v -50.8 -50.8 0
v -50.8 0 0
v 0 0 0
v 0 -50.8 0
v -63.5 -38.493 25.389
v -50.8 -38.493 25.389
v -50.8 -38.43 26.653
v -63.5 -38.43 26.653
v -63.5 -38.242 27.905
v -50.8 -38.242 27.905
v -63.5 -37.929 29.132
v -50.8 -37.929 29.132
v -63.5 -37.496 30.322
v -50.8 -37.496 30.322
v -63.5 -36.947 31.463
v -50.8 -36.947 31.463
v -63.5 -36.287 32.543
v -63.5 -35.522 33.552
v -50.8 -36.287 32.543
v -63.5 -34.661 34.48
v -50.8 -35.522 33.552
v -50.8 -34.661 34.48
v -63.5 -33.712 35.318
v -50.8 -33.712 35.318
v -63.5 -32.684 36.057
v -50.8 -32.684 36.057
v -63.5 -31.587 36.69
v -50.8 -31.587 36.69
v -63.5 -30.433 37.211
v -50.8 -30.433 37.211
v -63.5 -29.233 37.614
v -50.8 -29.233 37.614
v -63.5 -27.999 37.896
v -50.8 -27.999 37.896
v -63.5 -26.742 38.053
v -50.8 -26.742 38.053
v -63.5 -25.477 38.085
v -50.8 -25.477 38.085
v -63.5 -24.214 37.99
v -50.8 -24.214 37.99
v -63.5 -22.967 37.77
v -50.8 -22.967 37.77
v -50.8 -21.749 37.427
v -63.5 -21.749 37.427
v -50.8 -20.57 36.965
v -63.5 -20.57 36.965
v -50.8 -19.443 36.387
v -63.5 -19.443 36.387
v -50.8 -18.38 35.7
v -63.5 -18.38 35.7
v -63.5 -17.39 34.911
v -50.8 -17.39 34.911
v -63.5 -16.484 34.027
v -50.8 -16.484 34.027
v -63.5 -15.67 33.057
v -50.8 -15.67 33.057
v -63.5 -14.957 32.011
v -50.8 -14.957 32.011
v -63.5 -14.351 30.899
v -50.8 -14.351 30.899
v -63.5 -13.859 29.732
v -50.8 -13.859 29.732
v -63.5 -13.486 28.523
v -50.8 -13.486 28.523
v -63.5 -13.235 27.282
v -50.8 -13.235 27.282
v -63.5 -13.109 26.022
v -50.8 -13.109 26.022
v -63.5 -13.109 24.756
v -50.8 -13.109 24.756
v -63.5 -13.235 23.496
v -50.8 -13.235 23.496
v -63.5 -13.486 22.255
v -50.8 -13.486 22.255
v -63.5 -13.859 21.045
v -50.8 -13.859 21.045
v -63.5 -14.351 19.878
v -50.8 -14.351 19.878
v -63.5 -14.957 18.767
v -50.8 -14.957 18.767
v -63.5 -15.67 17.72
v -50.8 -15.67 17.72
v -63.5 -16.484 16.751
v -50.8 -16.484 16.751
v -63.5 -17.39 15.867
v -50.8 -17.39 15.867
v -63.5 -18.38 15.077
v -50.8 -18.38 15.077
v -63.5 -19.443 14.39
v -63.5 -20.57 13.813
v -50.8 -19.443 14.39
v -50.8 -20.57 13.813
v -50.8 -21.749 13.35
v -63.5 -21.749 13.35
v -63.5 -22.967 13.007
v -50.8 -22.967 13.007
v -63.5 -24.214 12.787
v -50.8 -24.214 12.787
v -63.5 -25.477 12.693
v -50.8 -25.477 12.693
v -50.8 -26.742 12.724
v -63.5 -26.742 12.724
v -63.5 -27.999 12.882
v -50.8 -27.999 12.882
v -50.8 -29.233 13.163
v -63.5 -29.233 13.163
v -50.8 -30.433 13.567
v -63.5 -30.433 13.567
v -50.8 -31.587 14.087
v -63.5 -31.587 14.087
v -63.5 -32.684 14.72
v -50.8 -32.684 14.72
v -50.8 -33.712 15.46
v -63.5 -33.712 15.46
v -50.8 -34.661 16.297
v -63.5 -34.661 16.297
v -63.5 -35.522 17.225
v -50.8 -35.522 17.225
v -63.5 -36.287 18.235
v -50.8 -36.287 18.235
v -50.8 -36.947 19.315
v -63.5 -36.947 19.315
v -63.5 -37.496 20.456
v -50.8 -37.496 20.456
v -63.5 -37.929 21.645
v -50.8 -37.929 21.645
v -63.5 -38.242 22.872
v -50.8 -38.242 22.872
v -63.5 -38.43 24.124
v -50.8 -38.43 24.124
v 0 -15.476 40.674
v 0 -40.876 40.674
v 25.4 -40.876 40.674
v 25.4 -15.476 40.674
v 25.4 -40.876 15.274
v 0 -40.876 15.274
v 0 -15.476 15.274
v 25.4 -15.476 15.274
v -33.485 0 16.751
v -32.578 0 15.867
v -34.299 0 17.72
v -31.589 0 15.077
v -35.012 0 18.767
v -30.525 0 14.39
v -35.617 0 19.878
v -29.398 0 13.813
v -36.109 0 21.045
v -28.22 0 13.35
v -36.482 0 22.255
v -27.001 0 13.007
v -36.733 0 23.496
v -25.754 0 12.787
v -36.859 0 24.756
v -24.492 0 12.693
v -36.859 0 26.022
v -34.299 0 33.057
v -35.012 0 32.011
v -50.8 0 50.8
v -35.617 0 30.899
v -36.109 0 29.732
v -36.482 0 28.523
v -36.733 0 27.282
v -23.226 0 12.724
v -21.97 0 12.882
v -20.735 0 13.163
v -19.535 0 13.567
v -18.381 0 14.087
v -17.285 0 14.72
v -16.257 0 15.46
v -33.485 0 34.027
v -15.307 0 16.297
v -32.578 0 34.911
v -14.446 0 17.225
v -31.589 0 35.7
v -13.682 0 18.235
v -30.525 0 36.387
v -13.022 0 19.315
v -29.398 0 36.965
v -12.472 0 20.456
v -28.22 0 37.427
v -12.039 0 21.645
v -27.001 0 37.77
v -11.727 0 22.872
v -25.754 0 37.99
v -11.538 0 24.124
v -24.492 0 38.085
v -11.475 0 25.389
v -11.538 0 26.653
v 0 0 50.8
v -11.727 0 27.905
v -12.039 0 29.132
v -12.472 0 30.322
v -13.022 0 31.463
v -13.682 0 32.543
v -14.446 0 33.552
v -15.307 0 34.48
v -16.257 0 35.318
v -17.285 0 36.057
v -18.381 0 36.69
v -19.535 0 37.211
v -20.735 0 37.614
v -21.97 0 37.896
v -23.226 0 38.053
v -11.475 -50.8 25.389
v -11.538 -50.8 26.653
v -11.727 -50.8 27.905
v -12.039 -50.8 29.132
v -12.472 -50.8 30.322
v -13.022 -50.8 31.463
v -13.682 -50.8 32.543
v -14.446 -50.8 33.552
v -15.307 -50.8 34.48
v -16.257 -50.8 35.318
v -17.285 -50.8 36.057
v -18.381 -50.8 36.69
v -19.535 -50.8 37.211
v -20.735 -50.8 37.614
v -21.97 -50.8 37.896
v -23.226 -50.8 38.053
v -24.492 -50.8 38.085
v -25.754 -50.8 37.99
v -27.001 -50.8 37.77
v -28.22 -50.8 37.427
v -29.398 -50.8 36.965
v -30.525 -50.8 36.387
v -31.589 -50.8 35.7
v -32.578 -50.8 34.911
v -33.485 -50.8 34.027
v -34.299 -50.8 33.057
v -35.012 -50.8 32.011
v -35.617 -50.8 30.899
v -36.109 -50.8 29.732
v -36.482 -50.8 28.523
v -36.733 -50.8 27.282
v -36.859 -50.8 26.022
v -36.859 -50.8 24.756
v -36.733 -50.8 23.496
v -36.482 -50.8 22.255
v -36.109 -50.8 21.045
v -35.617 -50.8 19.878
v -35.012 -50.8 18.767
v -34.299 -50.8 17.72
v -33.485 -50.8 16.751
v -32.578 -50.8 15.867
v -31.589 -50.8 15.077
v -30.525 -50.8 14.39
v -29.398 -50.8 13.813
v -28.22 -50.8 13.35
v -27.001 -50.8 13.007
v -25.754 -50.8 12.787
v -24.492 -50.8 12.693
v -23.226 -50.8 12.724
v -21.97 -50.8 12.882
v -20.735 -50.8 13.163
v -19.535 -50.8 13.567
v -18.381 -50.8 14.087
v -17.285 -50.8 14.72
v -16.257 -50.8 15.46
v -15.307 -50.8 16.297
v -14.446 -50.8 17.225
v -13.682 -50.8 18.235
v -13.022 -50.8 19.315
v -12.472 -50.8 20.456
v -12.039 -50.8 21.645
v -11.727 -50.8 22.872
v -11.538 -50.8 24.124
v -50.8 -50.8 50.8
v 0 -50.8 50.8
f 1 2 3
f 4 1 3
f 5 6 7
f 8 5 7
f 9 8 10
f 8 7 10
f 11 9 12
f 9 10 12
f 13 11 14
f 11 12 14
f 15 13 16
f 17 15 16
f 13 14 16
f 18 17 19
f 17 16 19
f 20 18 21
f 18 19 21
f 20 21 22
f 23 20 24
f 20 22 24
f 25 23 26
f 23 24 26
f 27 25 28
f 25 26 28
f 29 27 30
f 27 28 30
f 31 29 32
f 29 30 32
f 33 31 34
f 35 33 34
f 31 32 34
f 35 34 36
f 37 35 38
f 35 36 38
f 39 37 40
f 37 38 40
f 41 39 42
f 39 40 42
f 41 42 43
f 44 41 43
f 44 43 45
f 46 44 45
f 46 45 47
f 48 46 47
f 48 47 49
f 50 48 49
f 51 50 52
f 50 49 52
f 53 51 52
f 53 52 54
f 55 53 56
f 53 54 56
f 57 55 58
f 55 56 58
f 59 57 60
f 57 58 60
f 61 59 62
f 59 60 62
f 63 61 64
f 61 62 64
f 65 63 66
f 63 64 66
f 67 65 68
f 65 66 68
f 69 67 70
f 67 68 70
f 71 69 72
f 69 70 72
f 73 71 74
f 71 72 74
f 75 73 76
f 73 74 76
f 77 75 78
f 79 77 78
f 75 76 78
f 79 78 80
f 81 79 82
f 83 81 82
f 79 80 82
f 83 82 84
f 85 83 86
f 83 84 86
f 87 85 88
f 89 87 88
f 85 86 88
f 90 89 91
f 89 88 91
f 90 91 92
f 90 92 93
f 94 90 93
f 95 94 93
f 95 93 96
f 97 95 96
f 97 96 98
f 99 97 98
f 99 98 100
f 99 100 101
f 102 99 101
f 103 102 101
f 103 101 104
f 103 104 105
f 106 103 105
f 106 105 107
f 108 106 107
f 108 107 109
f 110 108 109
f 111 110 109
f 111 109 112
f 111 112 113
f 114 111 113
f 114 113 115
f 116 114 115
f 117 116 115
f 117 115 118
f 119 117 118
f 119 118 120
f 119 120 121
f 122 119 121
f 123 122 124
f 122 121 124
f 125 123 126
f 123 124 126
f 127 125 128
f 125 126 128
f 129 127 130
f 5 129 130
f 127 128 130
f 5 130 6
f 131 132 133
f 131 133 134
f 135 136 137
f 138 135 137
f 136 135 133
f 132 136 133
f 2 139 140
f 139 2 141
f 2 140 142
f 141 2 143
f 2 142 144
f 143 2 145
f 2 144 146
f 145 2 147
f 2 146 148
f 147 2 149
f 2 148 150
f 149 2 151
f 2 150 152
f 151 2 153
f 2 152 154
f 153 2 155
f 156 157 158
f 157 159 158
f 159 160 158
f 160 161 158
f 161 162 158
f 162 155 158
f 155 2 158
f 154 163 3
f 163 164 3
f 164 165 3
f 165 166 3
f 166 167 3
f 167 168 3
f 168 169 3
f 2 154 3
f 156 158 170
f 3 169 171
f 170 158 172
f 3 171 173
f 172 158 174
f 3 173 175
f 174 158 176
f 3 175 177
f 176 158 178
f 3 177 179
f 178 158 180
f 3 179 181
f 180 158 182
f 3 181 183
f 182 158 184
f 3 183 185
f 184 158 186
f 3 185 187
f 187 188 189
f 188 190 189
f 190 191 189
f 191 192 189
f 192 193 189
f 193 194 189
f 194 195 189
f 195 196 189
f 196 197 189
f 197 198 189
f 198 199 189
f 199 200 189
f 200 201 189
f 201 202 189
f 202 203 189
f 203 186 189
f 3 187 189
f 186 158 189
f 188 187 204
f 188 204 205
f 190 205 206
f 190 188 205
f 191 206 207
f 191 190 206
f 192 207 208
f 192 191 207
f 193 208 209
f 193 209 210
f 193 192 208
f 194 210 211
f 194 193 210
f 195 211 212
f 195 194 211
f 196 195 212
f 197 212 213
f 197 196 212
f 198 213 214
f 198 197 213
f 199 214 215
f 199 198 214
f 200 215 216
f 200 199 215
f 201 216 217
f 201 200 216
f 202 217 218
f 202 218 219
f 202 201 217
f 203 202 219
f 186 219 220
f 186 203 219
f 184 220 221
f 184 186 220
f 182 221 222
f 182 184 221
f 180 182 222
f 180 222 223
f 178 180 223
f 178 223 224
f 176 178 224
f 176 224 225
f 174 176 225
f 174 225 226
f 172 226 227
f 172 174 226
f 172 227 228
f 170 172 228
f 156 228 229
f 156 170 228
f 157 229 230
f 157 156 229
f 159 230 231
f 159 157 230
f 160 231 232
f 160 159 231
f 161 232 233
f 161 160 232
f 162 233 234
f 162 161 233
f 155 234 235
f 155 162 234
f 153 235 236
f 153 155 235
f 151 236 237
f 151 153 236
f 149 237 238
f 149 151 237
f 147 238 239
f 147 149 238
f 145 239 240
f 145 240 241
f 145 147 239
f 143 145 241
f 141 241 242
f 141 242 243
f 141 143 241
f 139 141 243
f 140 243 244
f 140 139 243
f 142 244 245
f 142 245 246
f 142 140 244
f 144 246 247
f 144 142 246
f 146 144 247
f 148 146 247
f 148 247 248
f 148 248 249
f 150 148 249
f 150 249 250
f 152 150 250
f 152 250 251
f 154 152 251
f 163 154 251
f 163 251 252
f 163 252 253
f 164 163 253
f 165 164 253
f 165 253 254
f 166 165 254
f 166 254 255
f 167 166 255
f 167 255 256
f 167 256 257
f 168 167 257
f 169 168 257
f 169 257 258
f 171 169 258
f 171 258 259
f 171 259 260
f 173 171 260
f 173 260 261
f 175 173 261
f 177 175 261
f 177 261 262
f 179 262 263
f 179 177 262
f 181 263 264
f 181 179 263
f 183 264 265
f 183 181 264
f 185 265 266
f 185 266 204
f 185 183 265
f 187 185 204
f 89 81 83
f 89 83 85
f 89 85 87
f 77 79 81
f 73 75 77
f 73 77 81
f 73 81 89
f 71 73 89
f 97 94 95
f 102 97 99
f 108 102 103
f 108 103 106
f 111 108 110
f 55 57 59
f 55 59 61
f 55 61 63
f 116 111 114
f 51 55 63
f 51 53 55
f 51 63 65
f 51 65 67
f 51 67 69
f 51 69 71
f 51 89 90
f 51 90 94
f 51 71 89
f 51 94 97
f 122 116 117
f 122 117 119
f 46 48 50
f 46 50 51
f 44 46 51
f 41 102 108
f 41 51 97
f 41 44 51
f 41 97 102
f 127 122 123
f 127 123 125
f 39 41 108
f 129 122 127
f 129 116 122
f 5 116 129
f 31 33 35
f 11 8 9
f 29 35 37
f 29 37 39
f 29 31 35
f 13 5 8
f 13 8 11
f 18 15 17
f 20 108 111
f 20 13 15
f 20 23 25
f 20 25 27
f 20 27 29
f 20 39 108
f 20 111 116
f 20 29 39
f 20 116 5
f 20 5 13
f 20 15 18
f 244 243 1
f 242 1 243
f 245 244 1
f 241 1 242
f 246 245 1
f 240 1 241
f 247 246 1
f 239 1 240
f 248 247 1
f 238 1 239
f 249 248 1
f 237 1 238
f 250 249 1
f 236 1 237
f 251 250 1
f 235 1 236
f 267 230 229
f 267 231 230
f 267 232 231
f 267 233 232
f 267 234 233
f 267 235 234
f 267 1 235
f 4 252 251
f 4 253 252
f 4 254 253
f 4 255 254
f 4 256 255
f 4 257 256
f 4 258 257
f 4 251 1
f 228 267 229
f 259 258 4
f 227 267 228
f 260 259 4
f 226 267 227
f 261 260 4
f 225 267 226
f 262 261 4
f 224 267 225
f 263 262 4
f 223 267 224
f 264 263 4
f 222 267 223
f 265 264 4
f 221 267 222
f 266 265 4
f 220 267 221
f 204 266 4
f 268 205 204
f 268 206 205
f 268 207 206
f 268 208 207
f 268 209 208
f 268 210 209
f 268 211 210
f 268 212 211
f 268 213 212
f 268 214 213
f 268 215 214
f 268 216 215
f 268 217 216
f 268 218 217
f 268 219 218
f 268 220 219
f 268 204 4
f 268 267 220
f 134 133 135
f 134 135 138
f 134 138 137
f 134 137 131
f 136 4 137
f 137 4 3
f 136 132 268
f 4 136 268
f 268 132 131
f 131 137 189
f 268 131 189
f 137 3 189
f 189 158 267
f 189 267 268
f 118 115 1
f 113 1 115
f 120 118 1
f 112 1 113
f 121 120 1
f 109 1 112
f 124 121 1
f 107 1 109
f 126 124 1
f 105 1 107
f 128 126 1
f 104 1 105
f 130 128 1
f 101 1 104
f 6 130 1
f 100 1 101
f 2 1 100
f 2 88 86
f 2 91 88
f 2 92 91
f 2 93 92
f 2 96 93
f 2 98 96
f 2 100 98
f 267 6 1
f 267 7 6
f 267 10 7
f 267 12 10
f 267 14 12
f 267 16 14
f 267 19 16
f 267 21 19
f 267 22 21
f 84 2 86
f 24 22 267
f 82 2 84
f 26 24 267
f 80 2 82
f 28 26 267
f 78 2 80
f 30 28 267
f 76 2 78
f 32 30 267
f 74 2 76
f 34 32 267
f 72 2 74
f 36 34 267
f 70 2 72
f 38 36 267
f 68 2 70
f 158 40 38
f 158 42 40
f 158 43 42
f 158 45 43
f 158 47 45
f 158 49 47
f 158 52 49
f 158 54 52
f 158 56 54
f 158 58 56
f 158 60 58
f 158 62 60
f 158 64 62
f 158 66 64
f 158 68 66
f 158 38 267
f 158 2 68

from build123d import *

# Parameters (mm, degrees)
F0_W     = 50.8
F0_H     = 50.8
F2_DEPTH = 50.8
F1_R     = 12.7
F3_DEPTH = 50.8
F4_R     = 12.7
F5_DEPTH = 12.7
F6_W     = 25.4
F6_H     = 25.4
F7_DEPTH = 25.4


with BuildPart() as f2:
    # F0 (on Front) → F2 (new body)
    with BuildSketch(Plane.XZ):
        with Locations((-25.4, 25.4)):
            Rectangle(F0_W, F0_H)
    extrude(amount=F2_DEPTH)

    # F1 (on Front) → F3 (cut)
    with BuildSketch(Plane.XZ):
        with Locations((-24.174957, 25.38876)):
            Circle(F1_R)
    extrude(amount=F3_DEPTH, mode=Mode.SUBTRACT)

    # F4 (on face) → F5 (join)
    with BuildSketch(Plane(origin=(-50.8, 0, 0), x_dir=(0, -1, 0), z_dir=(-1, 0, 0))):
        with Locations((25.793362, 25.38876)):
            Circle(F4_R)
    extrude(amount=F5_DEPTH)

    # F6 (on Right) → F7 (join)
    with BuildSketch(Plane.YZ):
        with Locations((-28.176018, 27.973717)):
            Rectangle(F6_W, F6_H)
    extrude(amount=F7_DEPTH)


solid = f2.part
